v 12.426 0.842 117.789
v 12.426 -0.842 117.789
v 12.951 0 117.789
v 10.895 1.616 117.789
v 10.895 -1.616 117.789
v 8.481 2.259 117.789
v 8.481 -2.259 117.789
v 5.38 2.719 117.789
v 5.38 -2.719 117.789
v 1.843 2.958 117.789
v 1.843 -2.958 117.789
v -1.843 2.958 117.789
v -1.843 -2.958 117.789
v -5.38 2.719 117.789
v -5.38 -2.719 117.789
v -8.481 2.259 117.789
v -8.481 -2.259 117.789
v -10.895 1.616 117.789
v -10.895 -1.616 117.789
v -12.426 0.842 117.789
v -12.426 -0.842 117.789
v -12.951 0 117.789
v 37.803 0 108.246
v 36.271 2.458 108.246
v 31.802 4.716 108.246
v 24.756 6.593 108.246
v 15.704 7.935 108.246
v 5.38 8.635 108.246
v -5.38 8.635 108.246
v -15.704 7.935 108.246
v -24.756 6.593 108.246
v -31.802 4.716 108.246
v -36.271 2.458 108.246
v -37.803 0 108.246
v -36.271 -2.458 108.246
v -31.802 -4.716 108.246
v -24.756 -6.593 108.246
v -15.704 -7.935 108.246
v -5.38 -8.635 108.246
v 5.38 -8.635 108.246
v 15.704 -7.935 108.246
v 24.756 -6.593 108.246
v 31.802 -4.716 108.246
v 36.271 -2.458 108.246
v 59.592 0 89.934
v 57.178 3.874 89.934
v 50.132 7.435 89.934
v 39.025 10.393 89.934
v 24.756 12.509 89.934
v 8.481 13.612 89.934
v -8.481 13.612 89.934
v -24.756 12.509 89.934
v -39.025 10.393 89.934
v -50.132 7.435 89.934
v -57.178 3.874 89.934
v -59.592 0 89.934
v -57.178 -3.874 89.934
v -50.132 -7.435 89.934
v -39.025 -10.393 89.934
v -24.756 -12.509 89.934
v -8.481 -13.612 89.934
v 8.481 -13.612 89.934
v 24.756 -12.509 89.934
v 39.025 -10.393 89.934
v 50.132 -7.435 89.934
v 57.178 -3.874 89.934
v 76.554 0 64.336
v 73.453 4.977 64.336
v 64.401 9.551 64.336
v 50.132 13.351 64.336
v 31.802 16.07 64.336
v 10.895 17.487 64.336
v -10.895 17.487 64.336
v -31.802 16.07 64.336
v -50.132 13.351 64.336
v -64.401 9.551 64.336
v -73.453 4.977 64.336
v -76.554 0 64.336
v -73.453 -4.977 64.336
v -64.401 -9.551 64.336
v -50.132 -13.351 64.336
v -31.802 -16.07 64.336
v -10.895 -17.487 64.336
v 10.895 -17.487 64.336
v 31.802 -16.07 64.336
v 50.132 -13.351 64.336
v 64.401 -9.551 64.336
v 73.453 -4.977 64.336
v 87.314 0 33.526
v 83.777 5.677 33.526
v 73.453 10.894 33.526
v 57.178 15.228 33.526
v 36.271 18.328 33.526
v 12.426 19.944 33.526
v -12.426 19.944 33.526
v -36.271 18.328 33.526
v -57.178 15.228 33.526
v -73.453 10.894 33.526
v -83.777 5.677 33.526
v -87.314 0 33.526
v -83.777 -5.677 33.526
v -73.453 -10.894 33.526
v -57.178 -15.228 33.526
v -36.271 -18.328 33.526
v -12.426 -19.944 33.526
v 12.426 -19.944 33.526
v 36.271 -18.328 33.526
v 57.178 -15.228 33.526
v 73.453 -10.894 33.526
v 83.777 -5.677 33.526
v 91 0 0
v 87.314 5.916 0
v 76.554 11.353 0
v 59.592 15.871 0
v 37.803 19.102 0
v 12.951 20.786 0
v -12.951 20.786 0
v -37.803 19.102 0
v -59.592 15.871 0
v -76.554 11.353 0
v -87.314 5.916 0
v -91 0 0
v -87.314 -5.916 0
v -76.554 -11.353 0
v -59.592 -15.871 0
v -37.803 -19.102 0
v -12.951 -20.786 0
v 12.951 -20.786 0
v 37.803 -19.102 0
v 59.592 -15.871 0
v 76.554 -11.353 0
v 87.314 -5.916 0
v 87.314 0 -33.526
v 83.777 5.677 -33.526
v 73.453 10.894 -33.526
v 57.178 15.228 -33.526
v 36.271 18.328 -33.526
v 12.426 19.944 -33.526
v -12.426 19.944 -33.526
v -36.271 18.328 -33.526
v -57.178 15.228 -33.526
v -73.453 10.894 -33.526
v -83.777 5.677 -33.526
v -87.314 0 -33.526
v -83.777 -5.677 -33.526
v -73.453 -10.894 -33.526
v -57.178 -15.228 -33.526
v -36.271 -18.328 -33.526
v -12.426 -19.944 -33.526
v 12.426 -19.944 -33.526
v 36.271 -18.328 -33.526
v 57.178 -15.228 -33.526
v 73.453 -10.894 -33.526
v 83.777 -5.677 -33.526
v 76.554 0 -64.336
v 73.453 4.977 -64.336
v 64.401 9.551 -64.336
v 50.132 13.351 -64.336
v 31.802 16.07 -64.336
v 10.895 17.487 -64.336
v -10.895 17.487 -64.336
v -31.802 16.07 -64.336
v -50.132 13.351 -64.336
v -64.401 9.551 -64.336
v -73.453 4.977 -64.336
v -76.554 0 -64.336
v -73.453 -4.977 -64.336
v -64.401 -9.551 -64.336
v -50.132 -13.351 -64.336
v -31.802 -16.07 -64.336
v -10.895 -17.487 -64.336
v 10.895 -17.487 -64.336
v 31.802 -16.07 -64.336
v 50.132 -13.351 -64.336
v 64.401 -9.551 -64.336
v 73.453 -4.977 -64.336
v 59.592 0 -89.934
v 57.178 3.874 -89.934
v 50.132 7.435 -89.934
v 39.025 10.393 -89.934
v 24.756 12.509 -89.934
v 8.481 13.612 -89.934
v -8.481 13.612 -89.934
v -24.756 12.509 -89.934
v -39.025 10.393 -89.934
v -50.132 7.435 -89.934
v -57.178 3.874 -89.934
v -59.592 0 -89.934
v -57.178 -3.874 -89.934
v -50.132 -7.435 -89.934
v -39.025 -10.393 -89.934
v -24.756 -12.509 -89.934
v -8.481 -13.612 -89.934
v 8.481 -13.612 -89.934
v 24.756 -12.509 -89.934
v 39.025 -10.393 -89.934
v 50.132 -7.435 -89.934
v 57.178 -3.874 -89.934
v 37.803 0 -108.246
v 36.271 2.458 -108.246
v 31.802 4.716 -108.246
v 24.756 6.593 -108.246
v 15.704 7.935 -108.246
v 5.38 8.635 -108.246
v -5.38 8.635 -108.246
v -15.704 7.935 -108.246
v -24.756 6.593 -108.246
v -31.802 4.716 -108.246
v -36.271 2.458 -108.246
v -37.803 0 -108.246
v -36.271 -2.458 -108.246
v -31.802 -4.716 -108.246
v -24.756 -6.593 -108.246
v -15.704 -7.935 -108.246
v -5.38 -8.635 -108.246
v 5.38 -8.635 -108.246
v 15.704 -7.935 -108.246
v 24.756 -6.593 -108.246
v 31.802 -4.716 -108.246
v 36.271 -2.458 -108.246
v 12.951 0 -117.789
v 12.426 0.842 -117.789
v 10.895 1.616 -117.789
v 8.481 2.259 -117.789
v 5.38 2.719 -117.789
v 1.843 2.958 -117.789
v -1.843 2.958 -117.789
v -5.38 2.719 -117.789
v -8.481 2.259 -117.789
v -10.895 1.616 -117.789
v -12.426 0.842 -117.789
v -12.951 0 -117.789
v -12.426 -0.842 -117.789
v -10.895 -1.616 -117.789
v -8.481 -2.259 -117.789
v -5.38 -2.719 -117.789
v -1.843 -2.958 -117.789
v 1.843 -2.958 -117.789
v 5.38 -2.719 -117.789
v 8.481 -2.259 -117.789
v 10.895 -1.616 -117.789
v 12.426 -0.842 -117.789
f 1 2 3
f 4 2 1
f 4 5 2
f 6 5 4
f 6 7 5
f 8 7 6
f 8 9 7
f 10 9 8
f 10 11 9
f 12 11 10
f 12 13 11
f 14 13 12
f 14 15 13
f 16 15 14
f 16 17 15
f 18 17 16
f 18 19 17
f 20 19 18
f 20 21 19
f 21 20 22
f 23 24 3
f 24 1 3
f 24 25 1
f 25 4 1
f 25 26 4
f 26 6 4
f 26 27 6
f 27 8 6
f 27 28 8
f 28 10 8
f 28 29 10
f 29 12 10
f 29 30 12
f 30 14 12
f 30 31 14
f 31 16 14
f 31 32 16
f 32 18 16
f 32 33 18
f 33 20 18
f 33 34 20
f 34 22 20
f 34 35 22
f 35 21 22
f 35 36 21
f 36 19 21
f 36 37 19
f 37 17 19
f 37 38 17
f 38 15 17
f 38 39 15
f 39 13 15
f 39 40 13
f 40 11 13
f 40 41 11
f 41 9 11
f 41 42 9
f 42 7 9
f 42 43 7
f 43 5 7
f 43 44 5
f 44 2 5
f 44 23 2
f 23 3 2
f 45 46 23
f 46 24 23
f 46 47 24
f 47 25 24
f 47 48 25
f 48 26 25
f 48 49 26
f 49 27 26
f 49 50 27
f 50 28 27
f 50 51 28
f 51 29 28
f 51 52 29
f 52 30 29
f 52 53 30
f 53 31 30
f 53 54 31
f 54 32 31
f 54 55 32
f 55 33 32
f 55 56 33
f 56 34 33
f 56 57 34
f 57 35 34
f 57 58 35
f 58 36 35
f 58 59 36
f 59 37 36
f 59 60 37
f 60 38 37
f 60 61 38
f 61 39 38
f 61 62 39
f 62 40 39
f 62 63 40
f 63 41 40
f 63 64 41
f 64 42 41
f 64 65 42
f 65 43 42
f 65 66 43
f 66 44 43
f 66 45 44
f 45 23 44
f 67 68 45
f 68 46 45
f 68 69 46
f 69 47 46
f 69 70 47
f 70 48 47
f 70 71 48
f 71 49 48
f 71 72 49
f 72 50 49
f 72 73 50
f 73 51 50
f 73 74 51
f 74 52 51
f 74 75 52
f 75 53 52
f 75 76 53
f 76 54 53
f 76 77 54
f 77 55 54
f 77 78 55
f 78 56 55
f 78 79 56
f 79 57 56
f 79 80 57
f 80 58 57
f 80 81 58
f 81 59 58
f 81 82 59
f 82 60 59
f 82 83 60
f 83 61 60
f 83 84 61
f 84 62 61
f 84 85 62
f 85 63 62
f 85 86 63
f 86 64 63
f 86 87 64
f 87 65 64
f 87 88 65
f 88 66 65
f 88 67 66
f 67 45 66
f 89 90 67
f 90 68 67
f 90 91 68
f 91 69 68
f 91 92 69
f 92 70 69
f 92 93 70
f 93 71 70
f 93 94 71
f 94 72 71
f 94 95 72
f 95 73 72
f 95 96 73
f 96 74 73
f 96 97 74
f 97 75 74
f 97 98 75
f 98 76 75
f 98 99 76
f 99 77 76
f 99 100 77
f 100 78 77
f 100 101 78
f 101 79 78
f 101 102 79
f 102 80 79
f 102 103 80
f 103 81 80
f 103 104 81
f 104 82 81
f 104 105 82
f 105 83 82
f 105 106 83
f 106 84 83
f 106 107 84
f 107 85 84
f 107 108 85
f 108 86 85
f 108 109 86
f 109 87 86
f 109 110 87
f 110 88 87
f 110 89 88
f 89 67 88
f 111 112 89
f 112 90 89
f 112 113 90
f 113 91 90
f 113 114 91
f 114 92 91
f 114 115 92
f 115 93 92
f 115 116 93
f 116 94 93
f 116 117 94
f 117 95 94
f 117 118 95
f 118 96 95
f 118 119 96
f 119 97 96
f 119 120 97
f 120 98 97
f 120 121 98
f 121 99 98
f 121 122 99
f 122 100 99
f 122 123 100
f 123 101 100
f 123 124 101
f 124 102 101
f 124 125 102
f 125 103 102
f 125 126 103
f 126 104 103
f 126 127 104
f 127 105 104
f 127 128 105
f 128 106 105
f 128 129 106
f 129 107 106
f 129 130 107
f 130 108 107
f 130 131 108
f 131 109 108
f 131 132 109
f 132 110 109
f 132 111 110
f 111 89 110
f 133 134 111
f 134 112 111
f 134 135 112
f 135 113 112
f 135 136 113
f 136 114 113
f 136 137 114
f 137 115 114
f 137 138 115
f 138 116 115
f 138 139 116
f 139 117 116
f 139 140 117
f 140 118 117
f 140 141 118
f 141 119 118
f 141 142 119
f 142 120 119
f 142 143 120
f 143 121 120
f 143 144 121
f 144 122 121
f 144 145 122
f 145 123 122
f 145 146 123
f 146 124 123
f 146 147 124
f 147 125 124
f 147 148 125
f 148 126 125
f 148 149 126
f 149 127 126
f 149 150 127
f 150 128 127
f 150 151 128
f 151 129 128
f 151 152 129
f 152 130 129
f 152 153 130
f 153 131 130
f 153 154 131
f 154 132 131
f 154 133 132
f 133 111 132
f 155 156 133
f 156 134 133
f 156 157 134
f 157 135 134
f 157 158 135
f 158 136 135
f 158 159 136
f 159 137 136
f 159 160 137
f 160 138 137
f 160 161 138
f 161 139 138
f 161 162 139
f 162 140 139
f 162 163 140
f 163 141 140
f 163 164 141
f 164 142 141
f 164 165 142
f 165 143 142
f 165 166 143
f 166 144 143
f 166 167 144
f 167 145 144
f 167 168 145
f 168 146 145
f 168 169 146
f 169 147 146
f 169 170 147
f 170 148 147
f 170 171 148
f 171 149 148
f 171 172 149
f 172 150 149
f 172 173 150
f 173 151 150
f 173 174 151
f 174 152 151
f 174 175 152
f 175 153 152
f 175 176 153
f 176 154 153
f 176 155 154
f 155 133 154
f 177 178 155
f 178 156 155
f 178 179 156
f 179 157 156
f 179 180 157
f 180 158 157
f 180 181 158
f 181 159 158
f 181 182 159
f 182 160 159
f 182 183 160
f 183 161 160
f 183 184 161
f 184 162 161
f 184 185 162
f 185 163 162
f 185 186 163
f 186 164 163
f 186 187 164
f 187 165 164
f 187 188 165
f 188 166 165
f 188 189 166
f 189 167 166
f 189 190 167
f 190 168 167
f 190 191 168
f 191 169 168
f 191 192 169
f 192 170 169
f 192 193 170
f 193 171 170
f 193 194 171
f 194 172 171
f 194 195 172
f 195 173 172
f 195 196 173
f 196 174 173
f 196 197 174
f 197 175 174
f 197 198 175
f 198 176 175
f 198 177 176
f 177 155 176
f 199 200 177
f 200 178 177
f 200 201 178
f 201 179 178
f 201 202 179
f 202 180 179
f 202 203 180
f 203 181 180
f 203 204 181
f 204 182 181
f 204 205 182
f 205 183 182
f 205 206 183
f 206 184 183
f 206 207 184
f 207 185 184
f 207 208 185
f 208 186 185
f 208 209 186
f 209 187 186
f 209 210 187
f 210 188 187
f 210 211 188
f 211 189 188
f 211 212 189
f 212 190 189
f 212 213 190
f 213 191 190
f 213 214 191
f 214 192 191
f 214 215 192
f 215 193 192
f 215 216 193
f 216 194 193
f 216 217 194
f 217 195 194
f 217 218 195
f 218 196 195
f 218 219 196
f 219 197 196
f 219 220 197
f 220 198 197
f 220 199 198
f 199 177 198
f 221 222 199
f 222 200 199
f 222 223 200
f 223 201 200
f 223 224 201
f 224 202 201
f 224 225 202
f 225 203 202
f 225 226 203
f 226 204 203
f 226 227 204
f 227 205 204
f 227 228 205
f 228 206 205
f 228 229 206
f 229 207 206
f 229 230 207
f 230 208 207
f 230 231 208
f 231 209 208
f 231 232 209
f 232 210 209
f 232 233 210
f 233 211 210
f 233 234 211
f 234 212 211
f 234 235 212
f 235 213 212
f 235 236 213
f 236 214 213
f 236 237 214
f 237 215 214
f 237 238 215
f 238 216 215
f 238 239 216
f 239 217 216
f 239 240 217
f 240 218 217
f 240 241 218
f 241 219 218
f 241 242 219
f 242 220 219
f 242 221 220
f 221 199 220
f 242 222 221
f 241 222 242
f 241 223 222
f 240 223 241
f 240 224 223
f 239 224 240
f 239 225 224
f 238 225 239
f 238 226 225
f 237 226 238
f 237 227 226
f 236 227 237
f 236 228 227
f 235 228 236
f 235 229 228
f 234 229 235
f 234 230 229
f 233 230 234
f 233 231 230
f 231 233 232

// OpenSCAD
// Generated by SolidPython 1.0.1 on 2020-07-29 00:46:50


scale(v = [13, 3, 17]) {
	sphere(r = 7);
}
/***********************************************
*********      SolidPython code:      **********
************************************************
 
# import packages: SolidPython
from solid import *
from solid.utils import *
from itertools import chain, combinations, permutations


class Resize:

    def __init__(self, scad_file):
        self.scad_file = scad_file
        #self.scad_file = import_scad(scad_file)
        # cone/cylinder param:
        self.r1 = 0
        self.r2 = 0
        self.h = 0
        # rectangular prism param:
        self.w = 0
        self.l = 0
        # ellipse param:
        self.r = 0

    # import OpenScad code (file name corresponds to shape)


    # classify shape + parameters
    def assign(self, param1, param2, param3):
        if self.scad_file == 'cone.scad':
            self.r1 = param1
            self.r2 = param2
            self.h = param3
        elif self.scad_file == 'cylinder.scad':
            self.r1 = param1
            self.r2 = param2
            self.h = param3
        elif self.scad_file == 'rectangularPrism.scad':
            self.h = param1
            self.l = param2
            self.w = param3
        else:
            self.r = param1
            self.h = param2

    # resize parameters
    def iterate(self):
        x = range(3, 20, 2)
        i = 1
        if self.scad_file == 'cone.scad':
            tempList = list(permutations(x, 2))
            for temp in tempList:
                param1 = temp[0]
                param2 = temp[1]
                filepath = 'produced_scad_files/' + 'cone' + str(param1) + '_' + str(param2) + '_' + '.scad'
                scad_render_to_file(cylinder(h=param1, r1=param2, r2=0), filepath)

        elif self.scad_file == 'cylinder.scad':
            tempList = list(permutations(x, 3))
            for temp in tempList:
                param1 = temp[0]
                param2 = temp[1]
                filepath = 'produced_scad_files/' + 'cylinder' + str(param1) + '_' + str(param2) + '_' + '.scad'
                scad_render_to_file(cylinder(h=param1, r1=param2, r2=param2), filepath)

        elif self.scad_file == 'rectangularPrism.scad':
            tempList = list(permutations(x, 3))
            for temp in tempList:
                param1 = temp[0]
                param2 = temp[1]
                param3 = temp[2]
                filepath = 'produced_scad_files/' + 'rectangularPrism' + str(param1) + '_' + str(param2) + '_' + str(
                    param3) + '.scad'
                scad_render_to_file(cube(size=(param1, param2, param3)), filepath)

        elif self.scad_file == 'ellipse.scad':
            tempList = list(permutations(x, 4))
            for temp in tempList:
                param1 = temp[0]
                param2 = temp[1]
                param3 = temp[2]
                param4 = temp[3]
                filepath = 'produced_scad_files/' + 'ellipse' + str(param1) + '_' + str(param2) + '_' + str(param3) + '_' + str(param4) + '.scad'
                scad_render_to_file(scale([param1, param2, param3])(sphere(r=param4)), filepath)

    def render_to_scadfile(self):
        scad_render_to_file(scad, 'example.scad') 
 
************************************************/
